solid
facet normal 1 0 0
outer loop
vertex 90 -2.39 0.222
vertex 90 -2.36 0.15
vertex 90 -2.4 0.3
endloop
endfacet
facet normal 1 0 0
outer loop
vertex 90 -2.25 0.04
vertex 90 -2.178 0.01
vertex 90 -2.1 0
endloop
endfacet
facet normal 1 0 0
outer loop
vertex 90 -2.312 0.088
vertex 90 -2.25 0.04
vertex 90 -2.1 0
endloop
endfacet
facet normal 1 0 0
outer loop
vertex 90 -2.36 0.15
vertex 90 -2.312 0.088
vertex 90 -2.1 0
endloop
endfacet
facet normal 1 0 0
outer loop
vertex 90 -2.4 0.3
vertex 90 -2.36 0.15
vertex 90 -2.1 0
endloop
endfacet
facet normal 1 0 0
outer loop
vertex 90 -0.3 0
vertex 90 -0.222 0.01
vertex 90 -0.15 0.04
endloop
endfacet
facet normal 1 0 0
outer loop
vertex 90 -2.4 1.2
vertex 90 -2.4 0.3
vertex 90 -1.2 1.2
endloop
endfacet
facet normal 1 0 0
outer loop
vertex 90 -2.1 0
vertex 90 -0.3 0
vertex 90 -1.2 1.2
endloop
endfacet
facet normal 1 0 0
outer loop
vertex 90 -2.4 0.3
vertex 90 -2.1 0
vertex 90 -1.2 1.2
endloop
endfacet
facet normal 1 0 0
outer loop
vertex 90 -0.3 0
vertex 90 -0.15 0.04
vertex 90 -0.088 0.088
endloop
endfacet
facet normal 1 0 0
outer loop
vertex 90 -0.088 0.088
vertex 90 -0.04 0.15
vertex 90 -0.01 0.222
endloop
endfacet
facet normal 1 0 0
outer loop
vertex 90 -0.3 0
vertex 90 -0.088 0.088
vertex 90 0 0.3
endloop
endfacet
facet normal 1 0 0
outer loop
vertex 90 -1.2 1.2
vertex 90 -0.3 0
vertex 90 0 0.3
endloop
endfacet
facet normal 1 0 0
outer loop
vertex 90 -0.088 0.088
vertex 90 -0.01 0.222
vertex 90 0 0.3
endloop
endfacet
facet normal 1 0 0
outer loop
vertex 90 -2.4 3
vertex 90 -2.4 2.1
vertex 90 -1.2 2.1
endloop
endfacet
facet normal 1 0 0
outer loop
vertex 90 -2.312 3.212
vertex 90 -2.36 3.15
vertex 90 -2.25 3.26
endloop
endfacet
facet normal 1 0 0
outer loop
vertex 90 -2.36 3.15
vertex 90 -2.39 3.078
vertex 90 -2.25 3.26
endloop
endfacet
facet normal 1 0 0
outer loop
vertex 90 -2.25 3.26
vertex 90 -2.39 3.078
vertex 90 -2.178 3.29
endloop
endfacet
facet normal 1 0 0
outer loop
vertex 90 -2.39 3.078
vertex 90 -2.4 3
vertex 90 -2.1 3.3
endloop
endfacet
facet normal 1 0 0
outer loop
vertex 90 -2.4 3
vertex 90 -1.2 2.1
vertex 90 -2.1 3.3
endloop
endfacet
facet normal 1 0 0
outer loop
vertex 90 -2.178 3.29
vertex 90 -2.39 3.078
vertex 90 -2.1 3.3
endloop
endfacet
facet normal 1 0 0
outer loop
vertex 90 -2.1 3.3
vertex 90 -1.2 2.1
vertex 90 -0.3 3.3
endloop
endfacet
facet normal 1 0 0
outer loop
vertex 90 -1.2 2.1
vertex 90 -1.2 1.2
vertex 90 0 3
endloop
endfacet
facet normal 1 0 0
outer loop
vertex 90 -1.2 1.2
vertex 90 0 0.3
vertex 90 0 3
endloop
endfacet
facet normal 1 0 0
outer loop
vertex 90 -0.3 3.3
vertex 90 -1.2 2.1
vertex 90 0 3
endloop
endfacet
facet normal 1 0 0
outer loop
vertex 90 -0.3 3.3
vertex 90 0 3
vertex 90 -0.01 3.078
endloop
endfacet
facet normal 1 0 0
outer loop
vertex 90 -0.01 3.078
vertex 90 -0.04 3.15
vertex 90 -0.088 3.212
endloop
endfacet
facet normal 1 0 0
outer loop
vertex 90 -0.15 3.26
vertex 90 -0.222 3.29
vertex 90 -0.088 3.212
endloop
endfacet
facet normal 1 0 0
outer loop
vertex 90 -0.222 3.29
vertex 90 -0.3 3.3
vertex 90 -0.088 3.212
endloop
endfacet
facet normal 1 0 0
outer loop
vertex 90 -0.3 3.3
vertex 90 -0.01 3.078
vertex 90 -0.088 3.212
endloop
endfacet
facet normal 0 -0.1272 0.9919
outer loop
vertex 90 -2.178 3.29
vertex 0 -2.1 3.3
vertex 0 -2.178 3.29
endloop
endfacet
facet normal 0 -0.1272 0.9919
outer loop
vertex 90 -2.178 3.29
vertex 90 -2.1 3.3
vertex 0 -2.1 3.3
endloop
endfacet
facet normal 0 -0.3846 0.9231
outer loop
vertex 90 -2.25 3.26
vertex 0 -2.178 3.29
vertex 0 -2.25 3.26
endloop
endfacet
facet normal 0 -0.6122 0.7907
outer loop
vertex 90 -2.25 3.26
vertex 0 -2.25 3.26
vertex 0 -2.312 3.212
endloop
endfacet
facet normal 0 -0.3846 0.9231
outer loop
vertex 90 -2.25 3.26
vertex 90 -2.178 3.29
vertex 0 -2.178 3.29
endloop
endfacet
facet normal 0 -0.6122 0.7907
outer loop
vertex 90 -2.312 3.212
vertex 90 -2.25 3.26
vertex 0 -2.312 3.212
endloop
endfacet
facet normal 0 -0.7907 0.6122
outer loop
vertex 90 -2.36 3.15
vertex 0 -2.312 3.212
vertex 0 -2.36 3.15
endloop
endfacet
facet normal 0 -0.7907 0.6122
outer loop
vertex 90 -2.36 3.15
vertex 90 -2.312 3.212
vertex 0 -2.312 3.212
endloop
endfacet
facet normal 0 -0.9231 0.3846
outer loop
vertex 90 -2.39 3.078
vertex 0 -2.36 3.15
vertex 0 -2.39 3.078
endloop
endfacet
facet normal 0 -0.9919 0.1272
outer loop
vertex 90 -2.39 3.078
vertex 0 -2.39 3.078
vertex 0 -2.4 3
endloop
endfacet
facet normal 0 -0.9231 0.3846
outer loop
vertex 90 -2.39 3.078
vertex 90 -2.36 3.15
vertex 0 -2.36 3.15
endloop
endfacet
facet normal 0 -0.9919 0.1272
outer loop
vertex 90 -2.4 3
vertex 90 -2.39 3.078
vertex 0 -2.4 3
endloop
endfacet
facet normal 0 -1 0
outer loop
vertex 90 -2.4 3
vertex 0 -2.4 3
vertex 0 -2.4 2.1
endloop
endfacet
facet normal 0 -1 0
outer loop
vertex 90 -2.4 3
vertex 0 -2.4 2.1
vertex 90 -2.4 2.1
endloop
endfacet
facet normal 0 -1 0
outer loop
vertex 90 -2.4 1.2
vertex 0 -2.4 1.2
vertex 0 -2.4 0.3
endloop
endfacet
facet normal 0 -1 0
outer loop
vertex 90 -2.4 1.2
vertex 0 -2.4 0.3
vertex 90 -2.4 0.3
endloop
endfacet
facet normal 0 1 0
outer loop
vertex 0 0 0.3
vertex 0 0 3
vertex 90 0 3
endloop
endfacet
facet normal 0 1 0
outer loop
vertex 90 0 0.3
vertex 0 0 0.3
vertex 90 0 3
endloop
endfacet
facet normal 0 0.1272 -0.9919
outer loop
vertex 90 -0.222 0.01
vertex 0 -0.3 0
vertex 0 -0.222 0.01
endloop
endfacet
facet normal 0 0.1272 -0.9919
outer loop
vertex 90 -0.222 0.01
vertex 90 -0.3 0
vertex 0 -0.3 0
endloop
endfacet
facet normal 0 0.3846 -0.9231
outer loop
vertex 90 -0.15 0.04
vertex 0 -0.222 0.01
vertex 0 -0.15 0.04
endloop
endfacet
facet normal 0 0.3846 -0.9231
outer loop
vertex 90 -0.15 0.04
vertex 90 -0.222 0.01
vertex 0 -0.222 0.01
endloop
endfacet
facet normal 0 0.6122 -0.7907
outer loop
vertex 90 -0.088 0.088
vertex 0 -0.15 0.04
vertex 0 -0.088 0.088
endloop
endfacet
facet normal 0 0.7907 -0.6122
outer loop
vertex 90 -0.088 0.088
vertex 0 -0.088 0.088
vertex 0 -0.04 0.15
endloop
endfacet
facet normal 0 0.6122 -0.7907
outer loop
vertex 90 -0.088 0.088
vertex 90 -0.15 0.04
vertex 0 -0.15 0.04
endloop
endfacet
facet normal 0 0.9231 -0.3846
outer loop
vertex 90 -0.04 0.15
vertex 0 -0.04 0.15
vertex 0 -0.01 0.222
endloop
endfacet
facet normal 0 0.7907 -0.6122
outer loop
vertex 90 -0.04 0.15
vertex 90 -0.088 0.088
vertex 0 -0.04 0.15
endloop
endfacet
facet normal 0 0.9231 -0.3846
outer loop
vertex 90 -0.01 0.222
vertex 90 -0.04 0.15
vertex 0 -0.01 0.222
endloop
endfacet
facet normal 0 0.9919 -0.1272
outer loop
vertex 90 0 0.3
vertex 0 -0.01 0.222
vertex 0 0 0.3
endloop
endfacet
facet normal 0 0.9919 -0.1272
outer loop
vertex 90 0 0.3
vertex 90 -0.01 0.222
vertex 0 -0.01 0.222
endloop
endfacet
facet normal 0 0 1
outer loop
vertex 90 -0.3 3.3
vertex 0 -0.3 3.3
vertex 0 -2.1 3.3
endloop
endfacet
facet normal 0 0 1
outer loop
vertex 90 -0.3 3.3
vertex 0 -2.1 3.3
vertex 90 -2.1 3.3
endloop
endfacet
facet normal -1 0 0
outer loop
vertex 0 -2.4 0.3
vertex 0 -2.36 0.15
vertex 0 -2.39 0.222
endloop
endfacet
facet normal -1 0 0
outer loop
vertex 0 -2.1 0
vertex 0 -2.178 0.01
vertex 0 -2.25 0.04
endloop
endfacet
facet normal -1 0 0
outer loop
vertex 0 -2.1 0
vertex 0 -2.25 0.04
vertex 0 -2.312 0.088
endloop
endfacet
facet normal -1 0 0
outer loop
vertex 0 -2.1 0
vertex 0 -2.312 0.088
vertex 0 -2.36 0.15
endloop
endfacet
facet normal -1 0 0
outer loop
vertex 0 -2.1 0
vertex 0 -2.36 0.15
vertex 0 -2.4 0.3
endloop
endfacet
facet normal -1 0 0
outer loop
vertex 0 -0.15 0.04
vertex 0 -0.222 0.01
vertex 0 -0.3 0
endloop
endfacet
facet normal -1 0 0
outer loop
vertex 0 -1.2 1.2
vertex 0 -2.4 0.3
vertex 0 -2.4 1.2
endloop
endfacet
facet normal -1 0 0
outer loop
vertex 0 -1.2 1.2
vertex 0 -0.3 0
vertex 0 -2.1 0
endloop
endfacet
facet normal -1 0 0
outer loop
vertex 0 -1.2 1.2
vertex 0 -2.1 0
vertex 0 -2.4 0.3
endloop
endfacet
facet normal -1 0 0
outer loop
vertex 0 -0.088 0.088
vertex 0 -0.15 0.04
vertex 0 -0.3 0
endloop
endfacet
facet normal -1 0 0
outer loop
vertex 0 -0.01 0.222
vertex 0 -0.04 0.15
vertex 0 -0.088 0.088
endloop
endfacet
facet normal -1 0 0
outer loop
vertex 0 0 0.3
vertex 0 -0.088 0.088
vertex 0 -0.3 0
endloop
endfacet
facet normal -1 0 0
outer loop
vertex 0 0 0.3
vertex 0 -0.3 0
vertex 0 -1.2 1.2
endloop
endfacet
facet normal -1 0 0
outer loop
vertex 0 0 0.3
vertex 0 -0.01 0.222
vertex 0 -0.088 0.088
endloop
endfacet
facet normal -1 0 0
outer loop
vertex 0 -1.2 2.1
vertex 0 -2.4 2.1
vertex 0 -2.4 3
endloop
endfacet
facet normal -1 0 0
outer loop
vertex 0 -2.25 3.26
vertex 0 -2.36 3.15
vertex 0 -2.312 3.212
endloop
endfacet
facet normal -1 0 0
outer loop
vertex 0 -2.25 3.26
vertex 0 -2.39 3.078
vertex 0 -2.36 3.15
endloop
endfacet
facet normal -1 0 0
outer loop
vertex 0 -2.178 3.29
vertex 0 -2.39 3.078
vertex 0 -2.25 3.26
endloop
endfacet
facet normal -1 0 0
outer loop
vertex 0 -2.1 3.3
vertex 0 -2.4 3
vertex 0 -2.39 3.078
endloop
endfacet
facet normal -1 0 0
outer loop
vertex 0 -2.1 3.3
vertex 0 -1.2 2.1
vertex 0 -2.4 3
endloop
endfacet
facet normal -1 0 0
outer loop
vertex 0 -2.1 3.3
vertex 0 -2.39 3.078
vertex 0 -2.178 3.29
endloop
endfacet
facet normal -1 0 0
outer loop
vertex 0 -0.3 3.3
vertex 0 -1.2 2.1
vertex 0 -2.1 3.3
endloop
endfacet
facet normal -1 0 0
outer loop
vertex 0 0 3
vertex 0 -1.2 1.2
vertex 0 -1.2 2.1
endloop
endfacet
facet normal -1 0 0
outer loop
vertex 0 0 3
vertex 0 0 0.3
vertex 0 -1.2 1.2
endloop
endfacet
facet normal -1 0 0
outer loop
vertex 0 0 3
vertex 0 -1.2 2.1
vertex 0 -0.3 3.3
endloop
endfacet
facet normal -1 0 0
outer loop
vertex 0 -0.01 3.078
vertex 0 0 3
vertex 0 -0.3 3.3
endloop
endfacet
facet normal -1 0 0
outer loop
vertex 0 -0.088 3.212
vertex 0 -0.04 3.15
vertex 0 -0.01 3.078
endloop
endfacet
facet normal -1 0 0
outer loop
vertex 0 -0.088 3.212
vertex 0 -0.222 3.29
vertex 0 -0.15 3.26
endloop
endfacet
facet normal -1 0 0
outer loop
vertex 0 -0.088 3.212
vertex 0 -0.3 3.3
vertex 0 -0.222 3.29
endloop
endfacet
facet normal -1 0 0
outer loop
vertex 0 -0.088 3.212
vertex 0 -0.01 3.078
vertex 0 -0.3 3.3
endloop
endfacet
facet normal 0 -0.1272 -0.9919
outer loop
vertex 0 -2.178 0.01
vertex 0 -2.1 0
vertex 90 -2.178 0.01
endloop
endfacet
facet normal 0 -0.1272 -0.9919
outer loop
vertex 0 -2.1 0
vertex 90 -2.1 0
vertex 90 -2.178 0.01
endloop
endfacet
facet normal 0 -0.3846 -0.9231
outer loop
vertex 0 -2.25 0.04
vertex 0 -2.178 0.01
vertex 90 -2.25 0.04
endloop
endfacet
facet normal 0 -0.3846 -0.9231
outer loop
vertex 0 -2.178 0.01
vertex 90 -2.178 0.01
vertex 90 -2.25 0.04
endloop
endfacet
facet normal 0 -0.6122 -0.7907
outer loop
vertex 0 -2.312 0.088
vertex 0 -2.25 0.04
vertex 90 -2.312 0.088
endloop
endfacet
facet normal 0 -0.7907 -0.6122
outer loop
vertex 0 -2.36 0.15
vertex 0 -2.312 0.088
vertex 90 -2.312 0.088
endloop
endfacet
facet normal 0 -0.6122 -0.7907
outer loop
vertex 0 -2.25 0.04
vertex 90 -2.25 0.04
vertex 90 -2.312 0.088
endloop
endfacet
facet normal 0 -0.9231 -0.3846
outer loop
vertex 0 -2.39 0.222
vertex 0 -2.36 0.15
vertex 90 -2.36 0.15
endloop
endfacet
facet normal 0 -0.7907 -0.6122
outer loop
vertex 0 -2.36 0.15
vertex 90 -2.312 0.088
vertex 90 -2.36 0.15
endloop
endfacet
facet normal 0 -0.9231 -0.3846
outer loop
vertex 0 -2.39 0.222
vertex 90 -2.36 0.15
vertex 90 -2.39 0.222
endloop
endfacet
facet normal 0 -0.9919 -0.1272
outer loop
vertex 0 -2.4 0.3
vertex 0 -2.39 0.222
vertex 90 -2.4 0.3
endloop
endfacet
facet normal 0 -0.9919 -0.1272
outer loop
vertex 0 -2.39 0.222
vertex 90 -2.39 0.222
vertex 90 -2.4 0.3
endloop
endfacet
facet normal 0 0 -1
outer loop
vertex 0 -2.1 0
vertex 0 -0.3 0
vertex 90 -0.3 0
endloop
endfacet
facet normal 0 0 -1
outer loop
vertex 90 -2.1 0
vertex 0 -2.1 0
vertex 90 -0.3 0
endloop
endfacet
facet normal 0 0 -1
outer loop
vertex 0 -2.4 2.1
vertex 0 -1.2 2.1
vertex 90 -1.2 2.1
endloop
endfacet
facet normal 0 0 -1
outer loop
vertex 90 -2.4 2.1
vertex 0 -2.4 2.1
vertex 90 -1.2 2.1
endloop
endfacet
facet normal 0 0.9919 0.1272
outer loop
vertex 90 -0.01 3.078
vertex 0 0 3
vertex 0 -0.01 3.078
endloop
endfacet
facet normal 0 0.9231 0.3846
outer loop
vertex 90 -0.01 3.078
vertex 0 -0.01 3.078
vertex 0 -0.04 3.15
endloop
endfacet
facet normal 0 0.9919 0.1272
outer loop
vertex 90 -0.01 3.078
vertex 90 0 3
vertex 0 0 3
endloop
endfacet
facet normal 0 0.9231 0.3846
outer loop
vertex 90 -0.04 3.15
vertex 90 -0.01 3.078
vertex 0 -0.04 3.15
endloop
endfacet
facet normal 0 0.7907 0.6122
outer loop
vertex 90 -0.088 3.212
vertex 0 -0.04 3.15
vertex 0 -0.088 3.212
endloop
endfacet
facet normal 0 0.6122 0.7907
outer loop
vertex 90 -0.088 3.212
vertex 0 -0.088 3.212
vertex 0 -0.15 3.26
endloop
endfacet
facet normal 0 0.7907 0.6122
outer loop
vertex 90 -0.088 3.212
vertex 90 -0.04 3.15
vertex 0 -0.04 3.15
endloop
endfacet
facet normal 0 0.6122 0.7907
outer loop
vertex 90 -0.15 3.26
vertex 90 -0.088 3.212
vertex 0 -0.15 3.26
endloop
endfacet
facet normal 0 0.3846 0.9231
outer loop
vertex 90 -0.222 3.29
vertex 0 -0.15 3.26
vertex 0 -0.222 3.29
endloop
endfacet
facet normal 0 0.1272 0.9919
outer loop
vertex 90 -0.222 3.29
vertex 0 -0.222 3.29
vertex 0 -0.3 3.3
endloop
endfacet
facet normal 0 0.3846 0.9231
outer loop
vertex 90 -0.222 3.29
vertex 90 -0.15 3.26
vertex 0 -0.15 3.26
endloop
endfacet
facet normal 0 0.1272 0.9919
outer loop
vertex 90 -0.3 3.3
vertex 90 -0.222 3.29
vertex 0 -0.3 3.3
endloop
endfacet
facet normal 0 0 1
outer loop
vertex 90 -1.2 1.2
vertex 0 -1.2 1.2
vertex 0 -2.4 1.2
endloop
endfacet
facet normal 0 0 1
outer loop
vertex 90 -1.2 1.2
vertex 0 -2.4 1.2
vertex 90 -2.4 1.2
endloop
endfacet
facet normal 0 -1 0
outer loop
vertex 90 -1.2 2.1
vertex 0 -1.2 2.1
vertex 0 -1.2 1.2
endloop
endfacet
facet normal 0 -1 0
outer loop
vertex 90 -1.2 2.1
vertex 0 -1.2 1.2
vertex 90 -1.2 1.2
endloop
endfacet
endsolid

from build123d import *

# Parameters (mm, degrees)
F0_W     = 90
F0_H     = 3.3
F1_DEPTH = 2.4
F2_T     = -1.2
F3_R     = 0.3


with BuildPart() as f1:
    # F0 (on Front) → F1 (new body)
    with BuildSketch(Plane.XZ):
        with Locations((45, 1.65)):
            Rectangle(F0_W, F0_H)
    extrude(amount=F1_DEPTH)

    # F2
    f2_openings = [f1.faces().sort_by_distance(p)[0] for p in [
        (45, -2.4, 1.65),
        (90, -1.2, 1.65),
        (0, -1.2, 1.65),
    ]]
    offset(amount=F2_T, openings=f2_openings)

    # F3
    f3_edges = [f1.edges().sort_by_distance(p)[0] for p in [
        (45, -2.4, 3.3),
        (45, 0, 3.3),
        (45, -2.4, 0),
        (45, 0, 0),
    ]]
    fillet(f3_edges, radius=F3_R)


solid = f1.part
